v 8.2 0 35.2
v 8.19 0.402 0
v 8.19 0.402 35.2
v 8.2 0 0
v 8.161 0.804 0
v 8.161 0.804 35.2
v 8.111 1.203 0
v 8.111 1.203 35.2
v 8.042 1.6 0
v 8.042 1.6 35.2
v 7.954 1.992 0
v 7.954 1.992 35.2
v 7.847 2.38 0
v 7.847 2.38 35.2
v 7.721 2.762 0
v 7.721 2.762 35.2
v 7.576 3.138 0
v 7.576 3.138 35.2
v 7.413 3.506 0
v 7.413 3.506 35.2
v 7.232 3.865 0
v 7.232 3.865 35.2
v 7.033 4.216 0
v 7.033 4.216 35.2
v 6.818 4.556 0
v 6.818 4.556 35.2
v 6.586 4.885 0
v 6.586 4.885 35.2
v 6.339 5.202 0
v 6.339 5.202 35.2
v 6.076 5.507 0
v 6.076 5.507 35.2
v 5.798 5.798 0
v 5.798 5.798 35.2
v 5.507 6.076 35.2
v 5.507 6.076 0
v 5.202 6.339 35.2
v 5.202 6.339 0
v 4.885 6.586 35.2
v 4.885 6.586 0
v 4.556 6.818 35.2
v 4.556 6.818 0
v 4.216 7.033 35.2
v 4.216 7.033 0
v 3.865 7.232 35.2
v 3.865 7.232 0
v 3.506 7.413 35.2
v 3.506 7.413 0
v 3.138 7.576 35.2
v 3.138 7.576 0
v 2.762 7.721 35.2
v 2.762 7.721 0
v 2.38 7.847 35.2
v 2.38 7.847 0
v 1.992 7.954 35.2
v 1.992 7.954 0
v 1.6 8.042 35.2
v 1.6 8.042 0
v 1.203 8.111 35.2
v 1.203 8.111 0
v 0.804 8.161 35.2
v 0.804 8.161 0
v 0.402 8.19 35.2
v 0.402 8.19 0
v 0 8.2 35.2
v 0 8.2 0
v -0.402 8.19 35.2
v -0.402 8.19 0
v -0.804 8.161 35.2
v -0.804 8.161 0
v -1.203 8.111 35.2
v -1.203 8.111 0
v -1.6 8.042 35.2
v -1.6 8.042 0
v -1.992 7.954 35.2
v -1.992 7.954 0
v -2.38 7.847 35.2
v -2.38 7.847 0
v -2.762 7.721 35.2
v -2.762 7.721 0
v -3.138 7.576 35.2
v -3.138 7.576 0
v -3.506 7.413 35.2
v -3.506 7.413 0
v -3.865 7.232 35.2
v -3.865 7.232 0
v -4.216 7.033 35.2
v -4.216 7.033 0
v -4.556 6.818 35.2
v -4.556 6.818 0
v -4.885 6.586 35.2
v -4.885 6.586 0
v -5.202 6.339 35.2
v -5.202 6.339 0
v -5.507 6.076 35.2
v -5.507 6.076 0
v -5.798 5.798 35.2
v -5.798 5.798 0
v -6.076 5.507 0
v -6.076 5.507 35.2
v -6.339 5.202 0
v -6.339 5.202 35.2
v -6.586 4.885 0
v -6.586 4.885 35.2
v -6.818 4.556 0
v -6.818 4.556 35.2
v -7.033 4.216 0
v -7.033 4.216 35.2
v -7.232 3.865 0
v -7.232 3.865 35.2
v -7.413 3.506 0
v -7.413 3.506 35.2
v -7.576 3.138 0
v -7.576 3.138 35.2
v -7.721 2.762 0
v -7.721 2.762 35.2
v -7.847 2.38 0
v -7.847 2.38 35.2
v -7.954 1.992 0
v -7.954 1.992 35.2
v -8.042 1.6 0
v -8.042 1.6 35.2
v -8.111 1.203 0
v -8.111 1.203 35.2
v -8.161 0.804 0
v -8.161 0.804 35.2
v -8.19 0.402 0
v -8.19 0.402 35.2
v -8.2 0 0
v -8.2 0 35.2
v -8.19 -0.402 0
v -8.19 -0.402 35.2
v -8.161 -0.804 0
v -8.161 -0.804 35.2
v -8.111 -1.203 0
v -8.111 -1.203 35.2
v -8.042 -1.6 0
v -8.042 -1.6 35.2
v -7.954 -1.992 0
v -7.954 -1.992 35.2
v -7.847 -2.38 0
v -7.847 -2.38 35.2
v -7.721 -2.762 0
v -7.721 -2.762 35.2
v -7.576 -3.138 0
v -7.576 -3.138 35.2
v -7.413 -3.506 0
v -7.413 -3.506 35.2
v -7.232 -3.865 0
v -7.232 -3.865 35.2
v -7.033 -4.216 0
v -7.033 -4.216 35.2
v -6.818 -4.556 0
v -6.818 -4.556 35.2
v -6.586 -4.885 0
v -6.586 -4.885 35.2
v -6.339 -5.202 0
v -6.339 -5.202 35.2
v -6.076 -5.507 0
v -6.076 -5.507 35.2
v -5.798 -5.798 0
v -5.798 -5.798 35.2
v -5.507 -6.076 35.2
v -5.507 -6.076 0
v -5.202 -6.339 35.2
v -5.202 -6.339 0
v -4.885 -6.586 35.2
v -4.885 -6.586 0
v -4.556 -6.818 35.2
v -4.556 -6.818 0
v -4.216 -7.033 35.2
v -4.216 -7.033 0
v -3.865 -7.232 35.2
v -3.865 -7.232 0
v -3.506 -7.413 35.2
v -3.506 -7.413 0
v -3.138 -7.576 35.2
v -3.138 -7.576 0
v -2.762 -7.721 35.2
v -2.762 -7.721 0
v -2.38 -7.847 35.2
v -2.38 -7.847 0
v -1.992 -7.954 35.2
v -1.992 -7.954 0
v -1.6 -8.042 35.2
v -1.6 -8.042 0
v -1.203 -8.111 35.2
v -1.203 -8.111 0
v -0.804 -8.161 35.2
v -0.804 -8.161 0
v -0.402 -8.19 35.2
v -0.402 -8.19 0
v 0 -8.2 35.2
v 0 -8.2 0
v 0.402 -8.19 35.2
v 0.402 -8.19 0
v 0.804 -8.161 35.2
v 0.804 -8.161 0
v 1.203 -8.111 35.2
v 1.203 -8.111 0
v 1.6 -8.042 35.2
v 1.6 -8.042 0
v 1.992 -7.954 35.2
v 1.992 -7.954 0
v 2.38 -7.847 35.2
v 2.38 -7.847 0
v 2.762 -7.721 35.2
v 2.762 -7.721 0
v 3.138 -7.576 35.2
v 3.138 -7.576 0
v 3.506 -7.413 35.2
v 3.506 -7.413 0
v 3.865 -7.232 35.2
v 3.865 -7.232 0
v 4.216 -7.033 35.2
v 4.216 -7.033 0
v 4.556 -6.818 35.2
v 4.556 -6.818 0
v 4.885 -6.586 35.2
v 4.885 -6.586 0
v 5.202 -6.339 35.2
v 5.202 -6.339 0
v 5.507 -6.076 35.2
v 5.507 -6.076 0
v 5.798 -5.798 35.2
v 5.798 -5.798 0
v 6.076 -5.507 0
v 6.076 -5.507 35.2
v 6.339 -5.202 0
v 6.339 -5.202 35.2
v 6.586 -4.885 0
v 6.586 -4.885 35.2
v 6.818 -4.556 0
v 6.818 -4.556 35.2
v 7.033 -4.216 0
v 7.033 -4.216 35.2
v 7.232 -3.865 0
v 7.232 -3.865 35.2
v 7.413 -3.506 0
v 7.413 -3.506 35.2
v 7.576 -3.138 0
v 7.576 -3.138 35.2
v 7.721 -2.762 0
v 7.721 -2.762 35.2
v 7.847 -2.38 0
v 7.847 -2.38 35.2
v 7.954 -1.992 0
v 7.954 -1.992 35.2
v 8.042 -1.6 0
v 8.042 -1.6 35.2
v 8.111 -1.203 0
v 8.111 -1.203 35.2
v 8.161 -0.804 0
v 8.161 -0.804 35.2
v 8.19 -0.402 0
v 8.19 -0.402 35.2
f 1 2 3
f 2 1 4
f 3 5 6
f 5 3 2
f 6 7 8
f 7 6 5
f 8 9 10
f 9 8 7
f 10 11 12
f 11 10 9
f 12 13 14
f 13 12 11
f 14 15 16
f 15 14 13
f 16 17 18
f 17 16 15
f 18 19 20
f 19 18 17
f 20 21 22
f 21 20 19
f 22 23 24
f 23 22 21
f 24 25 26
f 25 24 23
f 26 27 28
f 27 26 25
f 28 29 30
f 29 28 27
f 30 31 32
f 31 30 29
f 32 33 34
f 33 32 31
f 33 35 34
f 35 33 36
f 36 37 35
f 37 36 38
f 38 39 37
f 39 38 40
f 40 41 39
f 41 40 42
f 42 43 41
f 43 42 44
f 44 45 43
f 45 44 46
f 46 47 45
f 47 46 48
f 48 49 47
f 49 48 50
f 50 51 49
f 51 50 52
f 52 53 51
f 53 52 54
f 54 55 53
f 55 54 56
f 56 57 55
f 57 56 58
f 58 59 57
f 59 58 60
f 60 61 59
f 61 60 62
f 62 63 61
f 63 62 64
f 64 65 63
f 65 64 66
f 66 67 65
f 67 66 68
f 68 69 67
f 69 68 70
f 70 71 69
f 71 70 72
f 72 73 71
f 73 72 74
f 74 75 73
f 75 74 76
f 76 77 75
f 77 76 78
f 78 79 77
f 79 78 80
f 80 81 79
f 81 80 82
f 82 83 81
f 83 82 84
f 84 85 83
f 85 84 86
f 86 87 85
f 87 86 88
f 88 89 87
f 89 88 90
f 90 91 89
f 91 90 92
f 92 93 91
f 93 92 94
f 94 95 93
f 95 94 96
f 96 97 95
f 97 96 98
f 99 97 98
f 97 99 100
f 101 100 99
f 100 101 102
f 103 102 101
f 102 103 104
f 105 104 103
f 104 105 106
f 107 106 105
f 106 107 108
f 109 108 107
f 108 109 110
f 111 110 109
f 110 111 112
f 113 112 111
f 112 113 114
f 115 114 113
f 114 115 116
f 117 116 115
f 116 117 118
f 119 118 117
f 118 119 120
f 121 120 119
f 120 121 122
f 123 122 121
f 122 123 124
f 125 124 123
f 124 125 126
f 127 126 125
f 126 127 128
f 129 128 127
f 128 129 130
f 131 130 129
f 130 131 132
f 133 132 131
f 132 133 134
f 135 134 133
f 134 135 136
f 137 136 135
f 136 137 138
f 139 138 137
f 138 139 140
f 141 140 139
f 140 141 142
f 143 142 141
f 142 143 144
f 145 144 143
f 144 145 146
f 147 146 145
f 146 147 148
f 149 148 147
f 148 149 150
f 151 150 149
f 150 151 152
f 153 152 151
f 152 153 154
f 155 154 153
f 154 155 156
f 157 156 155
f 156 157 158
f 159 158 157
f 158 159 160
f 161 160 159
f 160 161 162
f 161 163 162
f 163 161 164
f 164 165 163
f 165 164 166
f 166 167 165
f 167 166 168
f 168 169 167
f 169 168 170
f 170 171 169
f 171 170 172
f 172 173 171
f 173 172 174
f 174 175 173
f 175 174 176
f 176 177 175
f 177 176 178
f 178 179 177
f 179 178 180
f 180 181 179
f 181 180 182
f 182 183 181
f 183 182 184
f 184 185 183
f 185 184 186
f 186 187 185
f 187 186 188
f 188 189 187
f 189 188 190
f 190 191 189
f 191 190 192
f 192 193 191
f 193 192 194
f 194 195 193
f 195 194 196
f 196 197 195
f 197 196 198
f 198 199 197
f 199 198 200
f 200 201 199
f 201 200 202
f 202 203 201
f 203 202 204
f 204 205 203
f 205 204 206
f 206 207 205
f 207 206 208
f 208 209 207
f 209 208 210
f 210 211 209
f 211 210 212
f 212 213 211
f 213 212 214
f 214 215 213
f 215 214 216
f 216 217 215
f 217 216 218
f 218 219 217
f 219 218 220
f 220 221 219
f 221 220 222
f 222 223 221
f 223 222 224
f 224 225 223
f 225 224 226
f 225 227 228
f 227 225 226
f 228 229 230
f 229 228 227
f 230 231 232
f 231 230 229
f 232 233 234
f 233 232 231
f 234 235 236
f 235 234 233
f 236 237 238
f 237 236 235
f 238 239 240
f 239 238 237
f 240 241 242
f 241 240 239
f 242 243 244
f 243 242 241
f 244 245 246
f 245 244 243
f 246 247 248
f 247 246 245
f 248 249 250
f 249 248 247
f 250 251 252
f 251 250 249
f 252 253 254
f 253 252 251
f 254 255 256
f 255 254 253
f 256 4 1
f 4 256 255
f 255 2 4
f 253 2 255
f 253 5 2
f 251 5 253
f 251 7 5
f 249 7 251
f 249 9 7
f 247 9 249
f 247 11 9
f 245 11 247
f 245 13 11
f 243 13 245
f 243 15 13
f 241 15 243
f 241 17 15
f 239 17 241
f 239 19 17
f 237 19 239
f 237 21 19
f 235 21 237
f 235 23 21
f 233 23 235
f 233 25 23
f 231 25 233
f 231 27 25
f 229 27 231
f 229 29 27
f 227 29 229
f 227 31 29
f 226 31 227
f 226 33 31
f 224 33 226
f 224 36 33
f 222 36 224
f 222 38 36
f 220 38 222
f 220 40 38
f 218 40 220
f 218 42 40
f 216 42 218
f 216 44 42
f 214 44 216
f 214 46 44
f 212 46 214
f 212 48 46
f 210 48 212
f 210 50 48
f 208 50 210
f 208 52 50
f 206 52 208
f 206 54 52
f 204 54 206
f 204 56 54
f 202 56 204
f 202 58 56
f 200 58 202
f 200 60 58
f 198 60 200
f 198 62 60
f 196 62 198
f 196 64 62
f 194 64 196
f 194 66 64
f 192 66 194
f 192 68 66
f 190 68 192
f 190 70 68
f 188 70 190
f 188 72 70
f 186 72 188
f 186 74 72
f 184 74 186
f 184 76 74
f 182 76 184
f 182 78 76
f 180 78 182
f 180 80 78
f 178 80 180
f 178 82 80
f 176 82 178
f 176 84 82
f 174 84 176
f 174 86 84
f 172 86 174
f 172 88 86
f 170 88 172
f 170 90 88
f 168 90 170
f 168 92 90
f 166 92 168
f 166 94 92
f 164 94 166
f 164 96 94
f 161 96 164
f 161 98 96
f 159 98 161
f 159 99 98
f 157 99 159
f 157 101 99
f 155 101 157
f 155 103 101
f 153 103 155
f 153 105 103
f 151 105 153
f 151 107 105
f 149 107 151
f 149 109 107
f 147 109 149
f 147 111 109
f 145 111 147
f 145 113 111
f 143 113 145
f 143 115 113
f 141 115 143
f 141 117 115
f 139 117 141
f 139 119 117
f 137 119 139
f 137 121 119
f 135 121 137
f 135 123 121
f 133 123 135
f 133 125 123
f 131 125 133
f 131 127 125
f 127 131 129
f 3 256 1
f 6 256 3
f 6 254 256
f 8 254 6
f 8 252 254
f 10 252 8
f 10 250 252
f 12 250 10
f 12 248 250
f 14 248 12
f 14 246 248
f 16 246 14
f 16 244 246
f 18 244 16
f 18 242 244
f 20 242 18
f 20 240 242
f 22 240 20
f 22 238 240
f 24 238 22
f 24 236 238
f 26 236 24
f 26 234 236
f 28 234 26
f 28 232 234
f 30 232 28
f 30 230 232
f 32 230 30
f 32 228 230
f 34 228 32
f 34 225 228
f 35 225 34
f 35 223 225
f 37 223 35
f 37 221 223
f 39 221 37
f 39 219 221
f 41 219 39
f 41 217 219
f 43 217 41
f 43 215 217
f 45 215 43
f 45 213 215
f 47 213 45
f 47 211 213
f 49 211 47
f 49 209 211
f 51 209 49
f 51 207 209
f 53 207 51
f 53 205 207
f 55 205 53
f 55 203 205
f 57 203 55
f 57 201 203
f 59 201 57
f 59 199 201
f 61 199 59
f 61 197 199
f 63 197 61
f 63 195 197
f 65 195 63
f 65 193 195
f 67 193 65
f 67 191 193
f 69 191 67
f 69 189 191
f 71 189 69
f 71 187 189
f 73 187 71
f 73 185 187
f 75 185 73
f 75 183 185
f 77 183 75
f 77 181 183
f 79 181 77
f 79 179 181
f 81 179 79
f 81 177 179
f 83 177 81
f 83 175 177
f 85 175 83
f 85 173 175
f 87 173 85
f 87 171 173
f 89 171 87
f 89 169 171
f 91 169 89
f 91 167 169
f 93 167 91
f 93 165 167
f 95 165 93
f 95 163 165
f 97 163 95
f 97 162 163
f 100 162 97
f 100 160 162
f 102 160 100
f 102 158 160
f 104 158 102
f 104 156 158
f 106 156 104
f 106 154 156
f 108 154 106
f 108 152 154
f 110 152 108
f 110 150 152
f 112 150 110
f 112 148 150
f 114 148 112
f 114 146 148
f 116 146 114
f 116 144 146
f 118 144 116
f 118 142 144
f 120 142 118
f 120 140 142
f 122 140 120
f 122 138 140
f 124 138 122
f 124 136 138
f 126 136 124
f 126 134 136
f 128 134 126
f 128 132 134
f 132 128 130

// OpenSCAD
$fn = 128;

height = 35.2;
diameter = 16.4;

cylinder(h = height, d = diameter);
